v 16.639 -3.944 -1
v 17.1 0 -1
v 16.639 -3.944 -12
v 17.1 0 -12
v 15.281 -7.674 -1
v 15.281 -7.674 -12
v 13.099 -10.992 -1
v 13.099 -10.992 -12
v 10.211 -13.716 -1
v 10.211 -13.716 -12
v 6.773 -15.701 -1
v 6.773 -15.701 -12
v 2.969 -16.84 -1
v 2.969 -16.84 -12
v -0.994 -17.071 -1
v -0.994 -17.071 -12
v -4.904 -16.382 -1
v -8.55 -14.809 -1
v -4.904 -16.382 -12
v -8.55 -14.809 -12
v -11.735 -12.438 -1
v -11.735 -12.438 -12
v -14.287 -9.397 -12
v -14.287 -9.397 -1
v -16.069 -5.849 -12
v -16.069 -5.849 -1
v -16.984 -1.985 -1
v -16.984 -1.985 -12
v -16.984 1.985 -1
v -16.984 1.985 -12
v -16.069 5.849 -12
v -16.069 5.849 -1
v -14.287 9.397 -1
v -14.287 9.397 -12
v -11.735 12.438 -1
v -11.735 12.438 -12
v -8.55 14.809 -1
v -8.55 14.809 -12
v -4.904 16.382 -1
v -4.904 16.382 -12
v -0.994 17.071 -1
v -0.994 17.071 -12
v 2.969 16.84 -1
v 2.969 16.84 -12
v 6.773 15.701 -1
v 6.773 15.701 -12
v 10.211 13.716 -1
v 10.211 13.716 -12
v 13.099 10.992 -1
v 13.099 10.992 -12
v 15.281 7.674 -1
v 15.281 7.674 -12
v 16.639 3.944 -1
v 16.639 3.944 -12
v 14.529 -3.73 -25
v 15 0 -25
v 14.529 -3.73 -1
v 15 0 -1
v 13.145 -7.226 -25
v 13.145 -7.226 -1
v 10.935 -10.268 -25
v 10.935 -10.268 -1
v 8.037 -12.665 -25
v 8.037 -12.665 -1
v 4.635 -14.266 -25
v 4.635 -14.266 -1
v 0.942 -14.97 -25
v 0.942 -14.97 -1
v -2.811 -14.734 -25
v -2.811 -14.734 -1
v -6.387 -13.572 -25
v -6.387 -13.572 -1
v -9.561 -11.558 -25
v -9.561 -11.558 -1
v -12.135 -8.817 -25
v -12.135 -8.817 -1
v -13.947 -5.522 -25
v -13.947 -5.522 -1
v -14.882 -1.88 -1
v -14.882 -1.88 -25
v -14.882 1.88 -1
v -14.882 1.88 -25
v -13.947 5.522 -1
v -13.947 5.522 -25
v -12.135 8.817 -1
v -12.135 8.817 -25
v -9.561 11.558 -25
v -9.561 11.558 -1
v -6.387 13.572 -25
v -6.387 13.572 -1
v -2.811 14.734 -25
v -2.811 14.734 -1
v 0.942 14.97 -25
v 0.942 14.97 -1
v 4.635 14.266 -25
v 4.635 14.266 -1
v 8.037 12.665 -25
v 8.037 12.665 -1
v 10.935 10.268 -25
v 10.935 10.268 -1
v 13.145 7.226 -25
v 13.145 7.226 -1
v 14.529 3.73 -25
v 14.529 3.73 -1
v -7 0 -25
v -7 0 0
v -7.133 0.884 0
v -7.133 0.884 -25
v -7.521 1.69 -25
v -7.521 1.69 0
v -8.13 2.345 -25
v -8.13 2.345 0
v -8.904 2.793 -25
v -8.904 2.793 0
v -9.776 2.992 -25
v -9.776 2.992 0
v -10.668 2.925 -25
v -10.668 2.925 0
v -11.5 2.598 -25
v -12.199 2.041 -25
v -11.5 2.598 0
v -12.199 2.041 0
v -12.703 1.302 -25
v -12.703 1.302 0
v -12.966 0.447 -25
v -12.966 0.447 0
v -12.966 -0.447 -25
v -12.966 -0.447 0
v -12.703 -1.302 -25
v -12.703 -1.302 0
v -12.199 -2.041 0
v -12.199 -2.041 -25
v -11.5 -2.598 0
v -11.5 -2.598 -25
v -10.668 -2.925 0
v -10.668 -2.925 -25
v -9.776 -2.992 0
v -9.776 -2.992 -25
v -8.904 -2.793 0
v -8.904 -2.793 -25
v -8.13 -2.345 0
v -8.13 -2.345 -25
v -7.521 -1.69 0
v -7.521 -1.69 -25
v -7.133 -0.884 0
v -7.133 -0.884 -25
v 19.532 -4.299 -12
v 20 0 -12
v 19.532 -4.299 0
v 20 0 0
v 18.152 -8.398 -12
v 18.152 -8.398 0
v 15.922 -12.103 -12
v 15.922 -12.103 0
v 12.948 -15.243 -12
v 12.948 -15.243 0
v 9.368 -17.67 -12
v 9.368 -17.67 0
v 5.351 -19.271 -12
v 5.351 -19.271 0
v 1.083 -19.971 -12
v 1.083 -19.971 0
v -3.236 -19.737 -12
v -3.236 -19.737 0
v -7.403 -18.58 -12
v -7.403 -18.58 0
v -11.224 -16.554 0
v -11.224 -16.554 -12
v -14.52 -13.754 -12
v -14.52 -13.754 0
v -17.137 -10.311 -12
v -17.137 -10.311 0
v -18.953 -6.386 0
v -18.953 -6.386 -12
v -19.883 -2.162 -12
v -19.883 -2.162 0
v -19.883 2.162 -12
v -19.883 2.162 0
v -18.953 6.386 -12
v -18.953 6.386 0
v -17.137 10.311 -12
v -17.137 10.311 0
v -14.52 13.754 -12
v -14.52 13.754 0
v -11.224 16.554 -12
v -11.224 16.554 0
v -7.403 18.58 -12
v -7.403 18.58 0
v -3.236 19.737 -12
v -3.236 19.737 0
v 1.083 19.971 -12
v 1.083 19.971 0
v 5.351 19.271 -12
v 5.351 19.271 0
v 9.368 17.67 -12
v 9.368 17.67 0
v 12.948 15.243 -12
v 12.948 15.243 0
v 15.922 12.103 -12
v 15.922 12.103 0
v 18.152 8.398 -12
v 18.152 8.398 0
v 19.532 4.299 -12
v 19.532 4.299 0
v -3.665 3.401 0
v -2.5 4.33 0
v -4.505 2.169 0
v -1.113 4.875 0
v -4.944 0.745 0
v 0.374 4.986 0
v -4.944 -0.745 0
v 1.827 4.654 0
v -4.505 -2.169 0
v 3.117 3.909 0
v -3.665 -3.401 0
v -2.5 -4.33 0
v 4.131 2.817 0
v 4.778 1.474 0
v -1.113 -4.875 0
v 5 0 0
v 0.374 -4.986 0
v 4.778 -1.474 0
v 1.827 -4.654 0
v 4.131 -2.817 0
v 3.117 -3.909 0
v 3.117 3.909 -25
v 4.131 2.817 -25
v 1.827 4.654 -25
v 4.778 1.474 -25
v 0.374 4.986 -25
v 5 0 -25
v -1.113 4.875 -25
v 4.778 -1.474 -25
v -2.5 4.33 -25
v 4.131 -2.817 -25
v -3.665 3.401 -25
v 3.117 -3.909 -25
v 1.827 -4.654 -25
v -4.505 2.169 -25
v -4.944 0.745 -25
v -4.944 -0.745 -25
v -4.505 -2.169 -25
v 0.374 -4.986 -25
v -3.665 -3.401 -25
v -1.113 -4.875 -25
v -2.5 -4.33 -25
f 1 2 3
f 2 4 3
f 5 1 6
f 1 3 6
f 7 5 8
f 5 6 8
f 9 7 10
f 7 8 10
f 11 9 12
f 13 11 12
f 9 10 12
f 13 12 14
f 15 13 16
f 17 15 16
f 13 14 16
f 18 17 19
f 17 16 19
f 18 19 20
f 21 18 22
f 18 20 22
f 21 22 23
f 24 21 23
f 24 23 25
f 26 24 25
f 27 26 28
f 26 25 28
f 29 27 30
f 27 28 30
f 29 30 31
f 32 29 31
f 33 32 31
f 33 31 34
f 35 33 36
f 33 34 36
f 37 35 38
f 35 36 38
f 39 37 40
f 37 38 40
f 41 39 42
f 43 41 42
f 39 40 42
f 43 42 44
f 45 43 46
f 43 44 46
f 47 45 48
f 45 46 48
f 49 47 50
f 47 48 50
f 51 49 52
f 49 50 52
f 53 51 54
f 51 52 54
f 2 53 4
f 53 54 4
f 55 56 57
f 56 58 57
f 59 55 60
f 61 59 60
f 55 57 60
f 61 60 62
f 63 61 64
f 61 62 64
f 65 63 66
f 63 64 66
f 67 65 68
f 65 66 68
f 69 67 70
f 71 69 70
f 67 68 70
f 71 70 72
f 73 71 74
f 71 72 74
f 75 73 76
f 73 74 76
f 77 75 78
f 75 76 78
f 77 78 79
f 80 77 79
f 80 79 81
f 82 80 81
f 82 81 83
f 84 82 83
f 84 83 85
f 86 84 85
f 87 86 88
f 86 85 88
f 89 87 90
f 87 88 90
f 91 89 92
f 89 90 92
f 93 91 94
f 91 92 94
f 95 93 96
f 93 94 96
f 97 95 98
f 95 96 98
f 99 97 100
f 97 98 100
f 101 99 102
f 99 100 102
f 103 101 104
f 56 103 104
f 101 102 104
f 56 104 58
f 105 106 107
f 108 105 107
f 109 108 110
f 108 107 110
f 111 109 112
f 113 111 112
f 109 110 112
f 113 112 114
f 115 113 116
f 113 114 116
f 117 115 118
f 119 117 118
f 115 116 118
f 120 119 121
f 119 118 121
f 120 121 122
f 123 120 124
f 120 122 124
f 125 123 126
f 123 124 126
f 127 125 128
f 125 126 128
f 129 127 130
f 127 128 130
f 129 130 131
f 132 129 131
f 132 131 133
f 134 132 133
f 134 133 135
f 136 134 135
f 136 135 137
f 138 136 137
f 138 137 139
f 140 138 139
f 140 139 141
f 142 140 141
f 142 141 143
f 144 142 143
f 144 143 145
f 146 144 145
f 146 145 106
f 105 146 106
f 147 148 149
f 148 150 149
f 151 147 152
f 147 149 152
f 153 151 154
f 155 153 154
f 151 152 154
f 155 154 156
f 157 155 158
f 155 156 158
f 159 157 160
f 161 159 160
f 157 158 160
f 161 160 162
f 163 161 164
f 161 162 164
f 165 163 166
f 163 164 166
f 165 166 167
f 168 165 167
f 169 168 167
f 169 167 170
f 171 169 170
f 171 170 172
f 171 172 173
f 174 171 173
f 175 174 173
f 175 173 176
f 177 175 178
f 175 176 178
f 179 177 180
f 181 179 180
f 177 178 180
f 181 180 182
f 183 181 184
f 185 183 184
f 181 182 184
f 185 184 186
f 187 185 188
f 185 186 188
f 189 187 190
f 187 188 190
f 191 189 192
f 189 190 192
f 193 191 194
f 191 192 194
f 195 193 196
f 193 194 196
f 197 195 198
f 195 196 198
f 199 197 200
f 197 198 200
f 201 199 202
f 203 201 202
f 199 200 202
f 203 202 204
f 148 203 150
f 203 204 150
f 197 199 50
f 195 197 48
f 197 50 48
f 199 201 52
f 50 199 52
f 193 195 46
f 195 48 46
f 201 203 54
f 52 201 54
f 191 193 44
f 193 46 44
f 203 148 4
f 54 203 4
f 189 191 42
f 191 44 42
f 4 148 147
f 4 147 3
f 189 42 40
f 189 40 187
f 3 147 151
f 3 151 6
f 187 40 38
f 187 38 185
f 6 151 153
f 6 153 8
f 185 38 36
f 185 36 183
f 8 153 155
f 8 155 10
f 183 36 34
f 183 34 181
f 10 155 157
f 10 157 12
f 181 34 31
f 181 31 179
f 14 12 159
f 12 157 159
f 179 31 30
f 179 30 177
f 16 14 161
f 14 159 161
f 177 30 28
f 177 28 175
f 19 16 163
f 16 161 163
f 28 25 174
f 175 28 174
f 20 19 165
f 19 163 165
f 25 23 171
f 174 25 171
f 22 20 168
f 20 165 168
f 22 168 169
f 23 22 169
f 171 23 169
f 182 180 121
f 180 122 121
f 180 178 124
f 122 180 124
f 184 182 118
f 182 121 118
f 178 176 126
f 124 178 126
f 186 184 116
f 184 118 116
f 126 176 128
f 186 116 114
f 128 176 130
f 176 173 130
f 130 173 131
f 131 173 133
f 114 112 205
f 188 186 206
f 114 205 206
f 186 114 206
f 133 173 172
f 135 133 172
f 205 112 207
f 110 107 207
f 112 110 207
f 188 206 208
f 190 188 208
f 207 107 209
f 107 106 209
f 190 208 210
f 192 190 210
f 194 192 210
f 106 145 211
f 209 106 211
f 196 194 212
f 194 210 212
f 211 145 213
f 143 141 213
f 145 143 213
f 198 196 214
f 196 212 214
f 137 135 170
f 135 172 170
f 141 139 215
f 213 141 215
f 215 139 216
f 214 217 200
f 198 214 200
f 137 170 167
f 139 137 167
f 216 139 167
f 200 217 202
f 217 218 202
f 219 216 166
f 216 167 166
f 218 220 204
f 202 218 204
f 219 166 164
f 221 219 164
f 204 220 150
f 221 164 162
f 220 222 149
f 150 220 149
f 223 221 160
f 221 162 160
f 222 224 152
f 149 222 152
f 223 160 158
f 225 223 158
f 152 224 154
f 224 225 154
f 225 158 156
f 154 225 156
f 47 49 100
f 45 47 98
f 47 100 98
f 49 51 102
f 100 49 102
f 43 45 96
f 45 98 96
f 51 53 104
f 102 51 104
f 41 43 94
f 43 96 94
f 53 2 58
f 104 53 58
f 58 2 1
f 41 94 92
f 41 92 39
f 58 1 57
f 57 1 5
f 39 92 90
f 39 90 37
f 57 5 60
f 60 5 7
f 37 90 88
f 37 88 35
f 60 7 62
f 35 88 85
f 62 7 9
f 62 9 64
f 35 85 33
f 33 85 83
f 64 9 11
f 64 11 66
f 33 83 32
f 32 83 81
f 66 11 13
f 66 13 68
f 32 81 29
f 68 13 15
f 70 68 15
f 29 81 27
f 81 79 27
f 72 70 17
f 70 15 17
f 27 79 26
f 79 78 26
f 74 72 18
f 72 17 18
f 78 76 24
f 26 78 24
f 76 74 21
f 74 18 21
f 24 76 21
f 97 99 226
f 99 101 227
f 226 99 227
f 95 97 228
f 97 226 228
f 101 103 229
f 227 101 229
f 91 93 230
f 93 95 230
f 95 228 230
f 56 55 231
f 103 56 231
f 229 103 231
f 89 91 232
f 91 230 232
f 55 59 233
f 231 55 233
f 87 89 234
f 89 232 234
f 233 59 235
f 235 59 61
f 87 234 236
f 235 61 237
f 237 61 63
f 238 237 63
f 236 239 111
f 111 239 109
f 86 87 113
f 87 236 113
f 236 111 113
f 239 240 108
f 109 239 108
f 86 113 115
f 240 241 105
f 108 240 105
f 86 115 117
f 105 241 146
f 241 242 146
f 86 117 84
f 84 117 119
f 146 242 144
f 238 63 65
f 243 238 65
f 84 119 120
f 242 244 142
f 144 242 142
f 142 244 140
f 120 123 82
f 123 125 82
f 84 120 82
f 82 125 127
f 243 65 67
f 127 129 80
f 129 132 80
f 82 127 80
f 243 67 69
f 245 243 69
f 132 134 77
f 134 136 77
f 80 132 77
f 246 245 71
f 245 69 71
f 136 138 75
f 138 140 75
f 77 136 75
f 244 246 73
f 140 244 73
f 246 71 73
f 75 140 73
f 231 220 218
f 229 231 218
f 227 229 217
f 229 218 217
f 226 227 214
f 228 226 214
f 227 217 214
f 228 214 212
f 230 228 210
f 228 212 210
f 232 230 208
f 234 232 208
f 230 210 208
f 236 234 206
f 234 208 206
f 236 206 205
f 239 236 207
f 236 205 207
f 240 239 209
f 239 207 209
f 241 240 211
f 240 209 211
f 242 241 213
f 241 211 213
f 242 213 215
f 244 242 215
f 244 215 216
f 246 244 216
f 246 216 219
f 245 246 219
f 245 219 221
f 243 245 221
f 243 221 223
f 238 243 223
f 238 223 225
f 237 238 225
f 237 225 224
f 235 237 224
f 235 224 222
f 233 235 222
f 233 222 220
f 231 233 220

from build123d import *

# Parameters (mm, degrees)
F2_R     = 5
F3_DEPTH = 25.001
F4_R     = 3
F5_DEPTH = 25.001


with BuildPart() as f1:
    # F0 (on Front) → F1 (revolve)
    with BuildSketch(Plane.XZ):
        Polygon((20, 0), (0, 0), (0, -25), (15, -25), (15, -1), (17.1, -1), (17.1, -12), (20, -12), align=None)
    revolve(axis=Axis((0, 0, -20.761178), (0, 0, -1)))

    # F2 (on Top) → F3 (cut, through all)
    with BuildSketch(Plane.XY):
        Circle(F2_R)
    extrude(amount=-F3_DEPTH, mode=Mode.SUBTRACT)

    # F4 (on face) → F5 (cut, through all)
    with BuildSketch(Plane.XY):
        with Locations((-10, 0)):
            Circle(F4_R)
    extrude(amount=-F5_DEPTH, mode=Mode.SUBTRACT)


solid = f1.part
